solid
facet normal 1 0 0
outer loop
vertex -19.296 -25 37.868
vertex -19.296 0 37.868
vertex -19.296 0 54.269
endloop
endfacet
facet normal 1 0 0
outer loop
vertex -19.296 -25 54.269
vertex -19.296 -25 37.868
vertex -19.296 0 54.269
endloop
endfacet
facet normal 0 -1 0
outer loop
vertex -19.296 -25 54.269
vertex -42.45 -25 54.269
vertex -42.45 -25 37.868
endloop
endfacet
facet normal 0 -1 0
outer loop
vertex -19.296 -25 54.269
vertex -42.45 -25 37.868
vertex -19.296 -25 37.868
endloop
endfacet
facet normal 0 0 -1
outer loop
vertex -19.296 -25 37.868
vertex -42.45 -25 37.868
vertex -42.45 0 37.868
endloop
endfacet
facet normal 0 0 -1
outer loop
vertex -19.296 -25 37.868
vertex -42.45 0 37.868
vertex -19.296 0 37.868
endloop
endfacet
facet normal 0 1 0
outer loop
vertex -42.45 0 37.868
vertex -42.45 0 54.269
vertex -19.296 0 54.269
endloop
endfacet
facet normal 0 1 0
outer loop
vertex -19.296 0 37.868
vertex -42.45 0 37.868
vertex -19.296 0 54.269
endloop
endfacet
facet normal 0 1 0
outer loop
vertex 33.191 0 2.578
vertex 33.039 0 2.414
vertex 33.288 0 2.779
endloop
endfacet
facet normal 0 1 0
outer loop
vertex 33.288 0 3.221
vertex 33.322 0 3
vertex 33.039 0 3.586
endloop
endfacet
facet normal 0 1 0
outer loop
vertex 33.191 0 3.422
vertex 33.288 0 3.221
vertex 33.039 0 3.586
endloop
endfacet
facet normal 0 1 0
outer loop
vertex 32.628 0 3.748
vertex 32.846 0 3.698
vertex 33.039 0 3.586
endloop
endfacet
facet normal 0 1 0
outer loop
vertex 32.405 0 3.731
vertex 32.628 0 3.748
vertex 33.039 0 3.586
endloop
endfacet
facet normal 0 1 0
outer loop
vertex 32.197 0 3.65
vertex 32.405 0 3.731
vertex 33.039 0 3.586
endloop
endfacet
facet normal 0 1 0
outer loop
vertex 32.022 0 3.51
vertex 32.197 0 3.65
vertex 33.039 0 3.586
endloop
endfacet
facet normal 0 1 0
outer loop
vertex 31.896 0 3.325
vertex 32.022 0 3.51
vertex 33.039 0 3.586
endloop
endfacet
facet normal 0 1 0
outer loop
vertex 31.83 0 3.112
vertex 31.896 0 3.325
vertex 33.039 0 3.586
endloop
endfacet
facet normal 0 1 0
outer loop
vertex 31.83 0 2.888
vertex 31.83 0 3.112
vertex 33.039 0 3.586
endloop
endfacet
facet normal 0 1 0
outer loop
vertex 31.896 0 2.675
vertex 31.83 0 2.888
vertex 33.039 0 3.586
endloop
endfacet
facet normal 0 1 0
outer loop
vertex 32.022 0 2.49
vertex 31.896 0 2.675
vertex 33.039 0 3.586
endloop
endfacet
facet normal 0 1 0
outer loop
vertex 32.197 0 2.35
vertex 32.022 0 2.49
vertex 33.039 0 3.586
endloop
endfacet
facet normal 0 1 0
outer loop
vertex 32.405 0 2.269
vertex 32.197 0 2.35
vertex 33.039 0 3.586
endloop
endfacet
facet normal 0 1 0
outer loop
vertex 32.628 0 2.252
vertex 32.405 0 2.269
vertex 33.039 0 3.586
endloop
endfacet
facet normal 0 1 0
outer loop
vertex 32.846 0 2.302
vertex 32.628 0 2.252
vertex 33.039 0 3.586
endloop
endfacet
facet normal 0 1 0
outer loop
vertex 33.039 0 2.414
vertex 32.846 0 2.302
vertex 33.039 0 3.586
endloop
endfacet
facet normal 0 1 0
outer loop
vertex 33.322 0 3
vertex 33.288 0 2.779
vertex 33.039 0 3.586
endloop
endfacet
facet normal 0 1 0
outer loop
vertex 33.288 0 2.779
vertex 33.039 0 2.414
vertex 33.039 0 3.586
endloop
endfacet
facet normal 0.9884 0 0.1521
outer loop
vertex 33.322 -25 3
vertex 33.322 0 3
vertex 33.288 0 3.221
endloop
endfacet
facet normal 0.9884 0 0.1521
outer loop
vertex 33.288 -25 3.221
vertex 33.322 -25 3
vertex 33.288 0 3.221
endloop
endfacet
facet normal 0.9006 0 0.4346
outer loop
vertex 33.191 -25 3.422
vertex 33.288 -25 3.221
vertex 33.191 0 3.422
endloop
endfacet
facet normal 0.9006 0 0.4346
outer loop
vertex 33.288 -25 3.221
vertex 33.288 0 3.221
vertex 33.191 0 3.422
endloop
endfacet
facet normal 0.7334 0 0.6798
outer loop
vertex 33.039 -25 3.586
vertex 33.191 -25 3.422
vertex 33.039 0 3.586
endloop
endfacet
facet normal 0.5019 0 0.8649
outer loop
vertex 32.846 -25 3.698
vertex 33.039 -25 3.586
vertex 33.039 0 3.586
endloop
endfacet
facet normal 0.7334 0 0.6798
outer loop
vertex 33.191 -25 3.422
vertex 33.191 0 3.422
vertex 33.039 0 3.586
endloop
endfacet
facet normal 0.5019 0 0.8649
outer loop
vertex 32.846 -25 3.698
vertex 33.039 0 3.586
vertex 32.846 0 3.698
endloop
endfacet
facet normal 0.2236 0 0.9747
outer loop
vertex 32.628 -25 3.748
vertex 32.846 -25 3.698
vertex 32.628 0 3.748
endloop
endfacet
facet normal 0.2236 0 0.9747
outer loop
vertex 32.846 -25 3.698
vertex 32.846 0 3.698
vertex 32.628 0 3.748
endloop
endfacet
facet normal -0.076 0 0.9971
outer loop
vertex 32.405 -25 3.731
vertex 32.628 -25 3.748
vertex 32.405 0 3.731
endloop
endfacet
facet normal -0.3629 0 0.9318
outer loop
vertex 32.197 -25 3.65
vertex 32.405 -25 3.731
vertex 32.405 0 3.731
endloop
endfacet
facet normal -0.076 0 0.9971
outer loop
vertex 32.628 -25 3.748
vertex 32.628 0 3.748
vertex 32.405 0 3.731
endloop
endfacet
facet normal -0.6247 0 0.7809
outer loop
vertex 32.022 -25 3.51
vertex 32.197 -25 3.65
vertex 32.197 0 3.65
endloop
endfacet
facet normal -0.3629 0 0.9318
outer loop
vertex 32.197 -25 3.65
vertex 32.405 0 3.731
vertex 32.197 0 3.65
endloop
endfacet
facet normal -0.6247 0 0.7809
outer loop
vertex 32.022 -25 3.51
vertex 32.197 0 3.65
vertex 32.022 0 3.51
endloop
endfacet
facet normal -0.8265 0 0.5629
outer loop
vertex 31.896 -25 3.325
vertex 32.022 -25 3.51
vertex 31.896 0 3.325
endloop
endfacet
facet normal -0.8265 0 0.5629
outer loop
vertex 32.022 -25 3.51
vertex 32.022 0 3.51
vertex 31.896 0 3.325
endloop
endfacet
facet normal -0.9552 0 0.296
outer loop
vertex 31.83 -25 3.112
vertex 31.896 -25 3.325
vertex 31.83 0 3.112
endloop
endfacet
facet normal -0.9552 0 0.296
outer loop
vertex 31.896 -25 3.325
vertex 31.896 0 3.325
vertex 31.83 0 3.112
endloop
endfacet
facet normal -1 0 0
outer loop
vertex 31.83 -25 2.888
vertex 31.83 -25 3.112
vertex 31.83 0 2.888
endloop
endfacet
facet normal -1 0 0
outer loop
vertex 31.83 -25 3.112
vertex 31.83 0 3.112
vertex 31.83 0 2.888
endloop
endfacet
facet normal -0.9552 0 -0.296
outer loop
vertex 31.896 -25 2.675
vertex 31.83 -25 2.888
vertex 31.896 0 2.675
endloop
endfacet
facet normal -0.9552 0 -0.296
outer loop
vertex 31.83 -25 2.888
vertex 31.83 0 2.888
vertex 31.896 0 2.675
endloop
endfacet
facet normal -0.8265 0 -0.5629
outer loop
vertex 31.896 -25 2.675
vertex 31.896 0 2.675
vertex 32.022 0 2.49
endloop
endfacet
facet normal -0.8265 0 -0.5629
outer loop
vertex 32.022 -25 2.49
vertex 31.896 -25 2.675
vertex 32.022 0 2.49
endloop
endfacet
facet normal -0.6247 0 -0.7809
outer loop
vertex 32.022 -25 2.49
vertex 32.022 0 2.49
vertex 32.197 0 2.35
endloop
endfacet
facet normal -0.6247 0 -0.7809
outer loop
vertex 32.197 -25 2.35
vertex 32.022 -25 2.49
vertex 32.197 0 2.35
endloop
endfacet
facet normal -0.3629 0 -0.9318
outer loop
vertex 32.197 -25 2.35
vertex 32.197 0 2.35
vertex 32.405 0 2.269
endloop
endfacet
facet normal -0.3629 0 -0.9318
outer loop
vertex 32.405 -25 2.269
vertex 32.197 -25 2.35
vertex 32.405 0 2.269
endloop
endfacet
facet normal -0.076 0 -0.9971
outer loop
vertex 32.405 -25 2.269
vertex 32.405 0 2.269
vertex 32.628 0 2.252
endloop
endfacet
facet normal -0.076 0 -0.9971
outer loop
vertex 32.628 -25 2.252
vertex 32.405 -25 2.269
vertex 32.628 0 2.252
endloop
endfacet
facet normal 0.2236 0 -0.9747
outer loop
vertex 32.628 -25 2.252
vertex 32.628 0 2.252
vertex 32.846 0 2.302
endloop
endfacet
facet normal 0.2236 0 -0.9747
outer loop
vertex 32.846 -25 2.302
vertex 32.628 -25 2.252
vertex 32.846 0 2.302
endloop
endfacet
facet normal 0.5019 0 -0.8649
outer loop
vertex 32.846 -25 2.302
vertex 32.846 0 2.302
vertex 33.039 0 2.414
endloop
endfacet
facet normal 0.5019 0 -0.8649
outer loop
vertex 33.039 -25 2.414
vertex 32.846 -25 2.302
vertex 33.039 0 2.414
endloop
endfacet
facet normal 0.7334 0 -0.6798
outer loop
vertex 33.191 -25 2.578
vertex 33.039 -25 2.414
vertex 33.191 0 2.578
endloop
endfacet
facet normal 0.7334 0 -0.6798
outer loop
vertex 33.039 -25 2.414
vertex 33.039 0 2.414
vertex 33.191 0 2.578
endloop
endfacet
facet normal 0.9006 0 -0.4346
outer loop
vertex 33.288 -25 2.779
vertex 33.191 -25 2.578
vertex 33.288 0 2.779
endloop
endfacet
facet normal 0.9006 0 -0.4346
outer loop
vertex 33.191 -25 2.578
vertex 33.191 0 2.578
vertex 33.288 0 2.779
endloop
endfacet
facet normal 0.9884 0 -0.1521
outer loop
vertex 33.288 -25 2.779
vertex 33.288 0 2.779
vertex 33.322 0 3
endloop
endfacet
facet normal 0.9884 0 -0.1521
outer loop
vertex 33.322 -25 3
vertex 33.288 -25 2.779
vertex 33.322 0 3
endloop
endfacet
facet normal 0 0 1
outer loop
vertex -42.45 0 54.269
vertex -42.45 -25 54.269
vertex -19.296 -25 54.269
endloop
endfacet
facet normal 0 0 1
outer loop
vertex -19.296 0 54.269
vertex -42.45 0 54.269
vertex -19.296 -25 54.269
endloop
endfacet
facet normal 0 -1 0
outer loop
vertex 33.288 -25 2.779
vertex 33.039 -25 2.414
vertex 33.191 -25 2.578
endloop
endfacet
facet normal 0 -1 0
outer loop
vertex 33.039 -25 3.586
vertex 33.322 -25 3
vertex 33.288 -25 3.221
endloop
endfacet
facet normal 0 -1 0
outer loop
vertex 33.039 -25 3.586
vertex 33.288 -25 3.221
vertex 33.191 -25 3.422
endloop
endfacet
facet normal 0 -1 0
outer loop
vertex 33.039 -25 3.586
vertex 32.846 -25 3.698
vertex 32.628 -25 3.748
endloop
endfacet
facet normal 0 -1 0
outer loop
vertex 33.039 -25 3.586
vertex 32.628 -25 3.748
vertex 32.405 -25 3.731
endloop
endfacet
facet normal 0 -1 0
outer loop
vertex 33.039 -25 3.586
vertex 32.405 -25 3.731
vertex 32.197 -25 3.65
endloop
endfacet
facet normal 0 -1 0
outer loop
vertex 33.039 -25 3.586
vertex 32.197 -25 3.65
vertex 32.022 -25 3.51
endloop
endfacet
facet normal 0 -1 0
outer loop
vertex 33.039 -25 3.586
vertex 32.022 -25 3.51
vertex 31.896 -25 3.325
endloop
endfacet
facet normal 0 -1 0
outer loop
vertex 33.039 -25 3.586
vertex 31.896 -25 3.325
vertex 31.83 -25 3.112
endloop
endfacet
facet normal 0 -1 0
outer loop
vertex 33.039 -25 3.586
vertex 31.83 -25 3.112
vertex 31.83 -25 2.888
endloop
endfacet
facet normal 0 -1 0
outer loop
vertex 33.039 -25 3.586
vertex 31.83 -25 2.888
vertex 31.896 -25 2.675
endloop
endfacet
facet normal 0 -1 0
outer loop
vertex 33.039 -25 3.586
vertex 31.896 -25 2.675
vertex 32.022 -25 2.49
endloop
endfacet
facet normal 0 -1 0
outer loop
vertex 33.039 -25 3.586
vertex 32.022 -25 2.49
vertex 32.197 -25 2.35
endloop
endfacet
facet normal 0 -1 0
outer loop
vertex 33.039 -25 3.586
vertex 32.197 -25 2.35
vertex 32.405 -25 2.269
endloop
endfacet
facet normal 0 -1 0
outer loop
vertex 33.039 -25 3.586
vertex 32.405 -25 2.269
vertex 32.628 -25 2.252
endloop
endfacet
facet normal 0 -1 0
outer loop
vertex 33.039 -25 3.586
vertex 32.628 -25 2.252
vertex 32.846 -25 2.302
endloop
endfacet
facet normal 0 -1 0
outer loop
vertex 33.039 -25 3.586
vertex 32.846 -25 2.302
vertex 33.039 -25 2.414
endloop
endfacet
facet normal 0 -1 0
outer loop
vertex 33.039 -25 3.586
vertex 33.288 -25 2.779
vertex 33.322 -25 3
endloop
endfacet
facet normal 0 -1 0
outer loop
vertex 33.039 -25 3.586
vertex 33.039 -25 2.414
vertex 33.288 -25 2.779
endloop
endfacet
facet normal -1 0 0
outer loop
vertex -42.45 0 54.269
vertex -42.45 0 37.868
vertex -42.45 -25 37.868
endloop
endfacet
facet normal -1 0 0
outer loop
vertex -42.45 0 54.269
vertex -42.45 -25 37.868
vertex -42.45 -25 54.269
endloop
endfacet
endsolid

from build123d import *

# Parameters (mm, degrees)
F0_W     = 23.154671
F0_H     = 16.401224
F1_DEPTH = 25


with BuildPart() as f1:
    # F0 (on Front) → F1 (new body)
    with BuildSketch(Plane.XZ):
        with BuildLine():
            ThreePointArc((31.821622, 3), (32.571622, 2.25), (33.321622, 3))
            ThreePointArc((33.321622, 3), (32.571622, 3.75), (31.821622, 3))
        make_face()
        with Locations((-30.872895, 46.068147)):
            Rectangle(F0_W, F0_H)
    extrude(amount=F1_DEPTH)


solid = f1.part
